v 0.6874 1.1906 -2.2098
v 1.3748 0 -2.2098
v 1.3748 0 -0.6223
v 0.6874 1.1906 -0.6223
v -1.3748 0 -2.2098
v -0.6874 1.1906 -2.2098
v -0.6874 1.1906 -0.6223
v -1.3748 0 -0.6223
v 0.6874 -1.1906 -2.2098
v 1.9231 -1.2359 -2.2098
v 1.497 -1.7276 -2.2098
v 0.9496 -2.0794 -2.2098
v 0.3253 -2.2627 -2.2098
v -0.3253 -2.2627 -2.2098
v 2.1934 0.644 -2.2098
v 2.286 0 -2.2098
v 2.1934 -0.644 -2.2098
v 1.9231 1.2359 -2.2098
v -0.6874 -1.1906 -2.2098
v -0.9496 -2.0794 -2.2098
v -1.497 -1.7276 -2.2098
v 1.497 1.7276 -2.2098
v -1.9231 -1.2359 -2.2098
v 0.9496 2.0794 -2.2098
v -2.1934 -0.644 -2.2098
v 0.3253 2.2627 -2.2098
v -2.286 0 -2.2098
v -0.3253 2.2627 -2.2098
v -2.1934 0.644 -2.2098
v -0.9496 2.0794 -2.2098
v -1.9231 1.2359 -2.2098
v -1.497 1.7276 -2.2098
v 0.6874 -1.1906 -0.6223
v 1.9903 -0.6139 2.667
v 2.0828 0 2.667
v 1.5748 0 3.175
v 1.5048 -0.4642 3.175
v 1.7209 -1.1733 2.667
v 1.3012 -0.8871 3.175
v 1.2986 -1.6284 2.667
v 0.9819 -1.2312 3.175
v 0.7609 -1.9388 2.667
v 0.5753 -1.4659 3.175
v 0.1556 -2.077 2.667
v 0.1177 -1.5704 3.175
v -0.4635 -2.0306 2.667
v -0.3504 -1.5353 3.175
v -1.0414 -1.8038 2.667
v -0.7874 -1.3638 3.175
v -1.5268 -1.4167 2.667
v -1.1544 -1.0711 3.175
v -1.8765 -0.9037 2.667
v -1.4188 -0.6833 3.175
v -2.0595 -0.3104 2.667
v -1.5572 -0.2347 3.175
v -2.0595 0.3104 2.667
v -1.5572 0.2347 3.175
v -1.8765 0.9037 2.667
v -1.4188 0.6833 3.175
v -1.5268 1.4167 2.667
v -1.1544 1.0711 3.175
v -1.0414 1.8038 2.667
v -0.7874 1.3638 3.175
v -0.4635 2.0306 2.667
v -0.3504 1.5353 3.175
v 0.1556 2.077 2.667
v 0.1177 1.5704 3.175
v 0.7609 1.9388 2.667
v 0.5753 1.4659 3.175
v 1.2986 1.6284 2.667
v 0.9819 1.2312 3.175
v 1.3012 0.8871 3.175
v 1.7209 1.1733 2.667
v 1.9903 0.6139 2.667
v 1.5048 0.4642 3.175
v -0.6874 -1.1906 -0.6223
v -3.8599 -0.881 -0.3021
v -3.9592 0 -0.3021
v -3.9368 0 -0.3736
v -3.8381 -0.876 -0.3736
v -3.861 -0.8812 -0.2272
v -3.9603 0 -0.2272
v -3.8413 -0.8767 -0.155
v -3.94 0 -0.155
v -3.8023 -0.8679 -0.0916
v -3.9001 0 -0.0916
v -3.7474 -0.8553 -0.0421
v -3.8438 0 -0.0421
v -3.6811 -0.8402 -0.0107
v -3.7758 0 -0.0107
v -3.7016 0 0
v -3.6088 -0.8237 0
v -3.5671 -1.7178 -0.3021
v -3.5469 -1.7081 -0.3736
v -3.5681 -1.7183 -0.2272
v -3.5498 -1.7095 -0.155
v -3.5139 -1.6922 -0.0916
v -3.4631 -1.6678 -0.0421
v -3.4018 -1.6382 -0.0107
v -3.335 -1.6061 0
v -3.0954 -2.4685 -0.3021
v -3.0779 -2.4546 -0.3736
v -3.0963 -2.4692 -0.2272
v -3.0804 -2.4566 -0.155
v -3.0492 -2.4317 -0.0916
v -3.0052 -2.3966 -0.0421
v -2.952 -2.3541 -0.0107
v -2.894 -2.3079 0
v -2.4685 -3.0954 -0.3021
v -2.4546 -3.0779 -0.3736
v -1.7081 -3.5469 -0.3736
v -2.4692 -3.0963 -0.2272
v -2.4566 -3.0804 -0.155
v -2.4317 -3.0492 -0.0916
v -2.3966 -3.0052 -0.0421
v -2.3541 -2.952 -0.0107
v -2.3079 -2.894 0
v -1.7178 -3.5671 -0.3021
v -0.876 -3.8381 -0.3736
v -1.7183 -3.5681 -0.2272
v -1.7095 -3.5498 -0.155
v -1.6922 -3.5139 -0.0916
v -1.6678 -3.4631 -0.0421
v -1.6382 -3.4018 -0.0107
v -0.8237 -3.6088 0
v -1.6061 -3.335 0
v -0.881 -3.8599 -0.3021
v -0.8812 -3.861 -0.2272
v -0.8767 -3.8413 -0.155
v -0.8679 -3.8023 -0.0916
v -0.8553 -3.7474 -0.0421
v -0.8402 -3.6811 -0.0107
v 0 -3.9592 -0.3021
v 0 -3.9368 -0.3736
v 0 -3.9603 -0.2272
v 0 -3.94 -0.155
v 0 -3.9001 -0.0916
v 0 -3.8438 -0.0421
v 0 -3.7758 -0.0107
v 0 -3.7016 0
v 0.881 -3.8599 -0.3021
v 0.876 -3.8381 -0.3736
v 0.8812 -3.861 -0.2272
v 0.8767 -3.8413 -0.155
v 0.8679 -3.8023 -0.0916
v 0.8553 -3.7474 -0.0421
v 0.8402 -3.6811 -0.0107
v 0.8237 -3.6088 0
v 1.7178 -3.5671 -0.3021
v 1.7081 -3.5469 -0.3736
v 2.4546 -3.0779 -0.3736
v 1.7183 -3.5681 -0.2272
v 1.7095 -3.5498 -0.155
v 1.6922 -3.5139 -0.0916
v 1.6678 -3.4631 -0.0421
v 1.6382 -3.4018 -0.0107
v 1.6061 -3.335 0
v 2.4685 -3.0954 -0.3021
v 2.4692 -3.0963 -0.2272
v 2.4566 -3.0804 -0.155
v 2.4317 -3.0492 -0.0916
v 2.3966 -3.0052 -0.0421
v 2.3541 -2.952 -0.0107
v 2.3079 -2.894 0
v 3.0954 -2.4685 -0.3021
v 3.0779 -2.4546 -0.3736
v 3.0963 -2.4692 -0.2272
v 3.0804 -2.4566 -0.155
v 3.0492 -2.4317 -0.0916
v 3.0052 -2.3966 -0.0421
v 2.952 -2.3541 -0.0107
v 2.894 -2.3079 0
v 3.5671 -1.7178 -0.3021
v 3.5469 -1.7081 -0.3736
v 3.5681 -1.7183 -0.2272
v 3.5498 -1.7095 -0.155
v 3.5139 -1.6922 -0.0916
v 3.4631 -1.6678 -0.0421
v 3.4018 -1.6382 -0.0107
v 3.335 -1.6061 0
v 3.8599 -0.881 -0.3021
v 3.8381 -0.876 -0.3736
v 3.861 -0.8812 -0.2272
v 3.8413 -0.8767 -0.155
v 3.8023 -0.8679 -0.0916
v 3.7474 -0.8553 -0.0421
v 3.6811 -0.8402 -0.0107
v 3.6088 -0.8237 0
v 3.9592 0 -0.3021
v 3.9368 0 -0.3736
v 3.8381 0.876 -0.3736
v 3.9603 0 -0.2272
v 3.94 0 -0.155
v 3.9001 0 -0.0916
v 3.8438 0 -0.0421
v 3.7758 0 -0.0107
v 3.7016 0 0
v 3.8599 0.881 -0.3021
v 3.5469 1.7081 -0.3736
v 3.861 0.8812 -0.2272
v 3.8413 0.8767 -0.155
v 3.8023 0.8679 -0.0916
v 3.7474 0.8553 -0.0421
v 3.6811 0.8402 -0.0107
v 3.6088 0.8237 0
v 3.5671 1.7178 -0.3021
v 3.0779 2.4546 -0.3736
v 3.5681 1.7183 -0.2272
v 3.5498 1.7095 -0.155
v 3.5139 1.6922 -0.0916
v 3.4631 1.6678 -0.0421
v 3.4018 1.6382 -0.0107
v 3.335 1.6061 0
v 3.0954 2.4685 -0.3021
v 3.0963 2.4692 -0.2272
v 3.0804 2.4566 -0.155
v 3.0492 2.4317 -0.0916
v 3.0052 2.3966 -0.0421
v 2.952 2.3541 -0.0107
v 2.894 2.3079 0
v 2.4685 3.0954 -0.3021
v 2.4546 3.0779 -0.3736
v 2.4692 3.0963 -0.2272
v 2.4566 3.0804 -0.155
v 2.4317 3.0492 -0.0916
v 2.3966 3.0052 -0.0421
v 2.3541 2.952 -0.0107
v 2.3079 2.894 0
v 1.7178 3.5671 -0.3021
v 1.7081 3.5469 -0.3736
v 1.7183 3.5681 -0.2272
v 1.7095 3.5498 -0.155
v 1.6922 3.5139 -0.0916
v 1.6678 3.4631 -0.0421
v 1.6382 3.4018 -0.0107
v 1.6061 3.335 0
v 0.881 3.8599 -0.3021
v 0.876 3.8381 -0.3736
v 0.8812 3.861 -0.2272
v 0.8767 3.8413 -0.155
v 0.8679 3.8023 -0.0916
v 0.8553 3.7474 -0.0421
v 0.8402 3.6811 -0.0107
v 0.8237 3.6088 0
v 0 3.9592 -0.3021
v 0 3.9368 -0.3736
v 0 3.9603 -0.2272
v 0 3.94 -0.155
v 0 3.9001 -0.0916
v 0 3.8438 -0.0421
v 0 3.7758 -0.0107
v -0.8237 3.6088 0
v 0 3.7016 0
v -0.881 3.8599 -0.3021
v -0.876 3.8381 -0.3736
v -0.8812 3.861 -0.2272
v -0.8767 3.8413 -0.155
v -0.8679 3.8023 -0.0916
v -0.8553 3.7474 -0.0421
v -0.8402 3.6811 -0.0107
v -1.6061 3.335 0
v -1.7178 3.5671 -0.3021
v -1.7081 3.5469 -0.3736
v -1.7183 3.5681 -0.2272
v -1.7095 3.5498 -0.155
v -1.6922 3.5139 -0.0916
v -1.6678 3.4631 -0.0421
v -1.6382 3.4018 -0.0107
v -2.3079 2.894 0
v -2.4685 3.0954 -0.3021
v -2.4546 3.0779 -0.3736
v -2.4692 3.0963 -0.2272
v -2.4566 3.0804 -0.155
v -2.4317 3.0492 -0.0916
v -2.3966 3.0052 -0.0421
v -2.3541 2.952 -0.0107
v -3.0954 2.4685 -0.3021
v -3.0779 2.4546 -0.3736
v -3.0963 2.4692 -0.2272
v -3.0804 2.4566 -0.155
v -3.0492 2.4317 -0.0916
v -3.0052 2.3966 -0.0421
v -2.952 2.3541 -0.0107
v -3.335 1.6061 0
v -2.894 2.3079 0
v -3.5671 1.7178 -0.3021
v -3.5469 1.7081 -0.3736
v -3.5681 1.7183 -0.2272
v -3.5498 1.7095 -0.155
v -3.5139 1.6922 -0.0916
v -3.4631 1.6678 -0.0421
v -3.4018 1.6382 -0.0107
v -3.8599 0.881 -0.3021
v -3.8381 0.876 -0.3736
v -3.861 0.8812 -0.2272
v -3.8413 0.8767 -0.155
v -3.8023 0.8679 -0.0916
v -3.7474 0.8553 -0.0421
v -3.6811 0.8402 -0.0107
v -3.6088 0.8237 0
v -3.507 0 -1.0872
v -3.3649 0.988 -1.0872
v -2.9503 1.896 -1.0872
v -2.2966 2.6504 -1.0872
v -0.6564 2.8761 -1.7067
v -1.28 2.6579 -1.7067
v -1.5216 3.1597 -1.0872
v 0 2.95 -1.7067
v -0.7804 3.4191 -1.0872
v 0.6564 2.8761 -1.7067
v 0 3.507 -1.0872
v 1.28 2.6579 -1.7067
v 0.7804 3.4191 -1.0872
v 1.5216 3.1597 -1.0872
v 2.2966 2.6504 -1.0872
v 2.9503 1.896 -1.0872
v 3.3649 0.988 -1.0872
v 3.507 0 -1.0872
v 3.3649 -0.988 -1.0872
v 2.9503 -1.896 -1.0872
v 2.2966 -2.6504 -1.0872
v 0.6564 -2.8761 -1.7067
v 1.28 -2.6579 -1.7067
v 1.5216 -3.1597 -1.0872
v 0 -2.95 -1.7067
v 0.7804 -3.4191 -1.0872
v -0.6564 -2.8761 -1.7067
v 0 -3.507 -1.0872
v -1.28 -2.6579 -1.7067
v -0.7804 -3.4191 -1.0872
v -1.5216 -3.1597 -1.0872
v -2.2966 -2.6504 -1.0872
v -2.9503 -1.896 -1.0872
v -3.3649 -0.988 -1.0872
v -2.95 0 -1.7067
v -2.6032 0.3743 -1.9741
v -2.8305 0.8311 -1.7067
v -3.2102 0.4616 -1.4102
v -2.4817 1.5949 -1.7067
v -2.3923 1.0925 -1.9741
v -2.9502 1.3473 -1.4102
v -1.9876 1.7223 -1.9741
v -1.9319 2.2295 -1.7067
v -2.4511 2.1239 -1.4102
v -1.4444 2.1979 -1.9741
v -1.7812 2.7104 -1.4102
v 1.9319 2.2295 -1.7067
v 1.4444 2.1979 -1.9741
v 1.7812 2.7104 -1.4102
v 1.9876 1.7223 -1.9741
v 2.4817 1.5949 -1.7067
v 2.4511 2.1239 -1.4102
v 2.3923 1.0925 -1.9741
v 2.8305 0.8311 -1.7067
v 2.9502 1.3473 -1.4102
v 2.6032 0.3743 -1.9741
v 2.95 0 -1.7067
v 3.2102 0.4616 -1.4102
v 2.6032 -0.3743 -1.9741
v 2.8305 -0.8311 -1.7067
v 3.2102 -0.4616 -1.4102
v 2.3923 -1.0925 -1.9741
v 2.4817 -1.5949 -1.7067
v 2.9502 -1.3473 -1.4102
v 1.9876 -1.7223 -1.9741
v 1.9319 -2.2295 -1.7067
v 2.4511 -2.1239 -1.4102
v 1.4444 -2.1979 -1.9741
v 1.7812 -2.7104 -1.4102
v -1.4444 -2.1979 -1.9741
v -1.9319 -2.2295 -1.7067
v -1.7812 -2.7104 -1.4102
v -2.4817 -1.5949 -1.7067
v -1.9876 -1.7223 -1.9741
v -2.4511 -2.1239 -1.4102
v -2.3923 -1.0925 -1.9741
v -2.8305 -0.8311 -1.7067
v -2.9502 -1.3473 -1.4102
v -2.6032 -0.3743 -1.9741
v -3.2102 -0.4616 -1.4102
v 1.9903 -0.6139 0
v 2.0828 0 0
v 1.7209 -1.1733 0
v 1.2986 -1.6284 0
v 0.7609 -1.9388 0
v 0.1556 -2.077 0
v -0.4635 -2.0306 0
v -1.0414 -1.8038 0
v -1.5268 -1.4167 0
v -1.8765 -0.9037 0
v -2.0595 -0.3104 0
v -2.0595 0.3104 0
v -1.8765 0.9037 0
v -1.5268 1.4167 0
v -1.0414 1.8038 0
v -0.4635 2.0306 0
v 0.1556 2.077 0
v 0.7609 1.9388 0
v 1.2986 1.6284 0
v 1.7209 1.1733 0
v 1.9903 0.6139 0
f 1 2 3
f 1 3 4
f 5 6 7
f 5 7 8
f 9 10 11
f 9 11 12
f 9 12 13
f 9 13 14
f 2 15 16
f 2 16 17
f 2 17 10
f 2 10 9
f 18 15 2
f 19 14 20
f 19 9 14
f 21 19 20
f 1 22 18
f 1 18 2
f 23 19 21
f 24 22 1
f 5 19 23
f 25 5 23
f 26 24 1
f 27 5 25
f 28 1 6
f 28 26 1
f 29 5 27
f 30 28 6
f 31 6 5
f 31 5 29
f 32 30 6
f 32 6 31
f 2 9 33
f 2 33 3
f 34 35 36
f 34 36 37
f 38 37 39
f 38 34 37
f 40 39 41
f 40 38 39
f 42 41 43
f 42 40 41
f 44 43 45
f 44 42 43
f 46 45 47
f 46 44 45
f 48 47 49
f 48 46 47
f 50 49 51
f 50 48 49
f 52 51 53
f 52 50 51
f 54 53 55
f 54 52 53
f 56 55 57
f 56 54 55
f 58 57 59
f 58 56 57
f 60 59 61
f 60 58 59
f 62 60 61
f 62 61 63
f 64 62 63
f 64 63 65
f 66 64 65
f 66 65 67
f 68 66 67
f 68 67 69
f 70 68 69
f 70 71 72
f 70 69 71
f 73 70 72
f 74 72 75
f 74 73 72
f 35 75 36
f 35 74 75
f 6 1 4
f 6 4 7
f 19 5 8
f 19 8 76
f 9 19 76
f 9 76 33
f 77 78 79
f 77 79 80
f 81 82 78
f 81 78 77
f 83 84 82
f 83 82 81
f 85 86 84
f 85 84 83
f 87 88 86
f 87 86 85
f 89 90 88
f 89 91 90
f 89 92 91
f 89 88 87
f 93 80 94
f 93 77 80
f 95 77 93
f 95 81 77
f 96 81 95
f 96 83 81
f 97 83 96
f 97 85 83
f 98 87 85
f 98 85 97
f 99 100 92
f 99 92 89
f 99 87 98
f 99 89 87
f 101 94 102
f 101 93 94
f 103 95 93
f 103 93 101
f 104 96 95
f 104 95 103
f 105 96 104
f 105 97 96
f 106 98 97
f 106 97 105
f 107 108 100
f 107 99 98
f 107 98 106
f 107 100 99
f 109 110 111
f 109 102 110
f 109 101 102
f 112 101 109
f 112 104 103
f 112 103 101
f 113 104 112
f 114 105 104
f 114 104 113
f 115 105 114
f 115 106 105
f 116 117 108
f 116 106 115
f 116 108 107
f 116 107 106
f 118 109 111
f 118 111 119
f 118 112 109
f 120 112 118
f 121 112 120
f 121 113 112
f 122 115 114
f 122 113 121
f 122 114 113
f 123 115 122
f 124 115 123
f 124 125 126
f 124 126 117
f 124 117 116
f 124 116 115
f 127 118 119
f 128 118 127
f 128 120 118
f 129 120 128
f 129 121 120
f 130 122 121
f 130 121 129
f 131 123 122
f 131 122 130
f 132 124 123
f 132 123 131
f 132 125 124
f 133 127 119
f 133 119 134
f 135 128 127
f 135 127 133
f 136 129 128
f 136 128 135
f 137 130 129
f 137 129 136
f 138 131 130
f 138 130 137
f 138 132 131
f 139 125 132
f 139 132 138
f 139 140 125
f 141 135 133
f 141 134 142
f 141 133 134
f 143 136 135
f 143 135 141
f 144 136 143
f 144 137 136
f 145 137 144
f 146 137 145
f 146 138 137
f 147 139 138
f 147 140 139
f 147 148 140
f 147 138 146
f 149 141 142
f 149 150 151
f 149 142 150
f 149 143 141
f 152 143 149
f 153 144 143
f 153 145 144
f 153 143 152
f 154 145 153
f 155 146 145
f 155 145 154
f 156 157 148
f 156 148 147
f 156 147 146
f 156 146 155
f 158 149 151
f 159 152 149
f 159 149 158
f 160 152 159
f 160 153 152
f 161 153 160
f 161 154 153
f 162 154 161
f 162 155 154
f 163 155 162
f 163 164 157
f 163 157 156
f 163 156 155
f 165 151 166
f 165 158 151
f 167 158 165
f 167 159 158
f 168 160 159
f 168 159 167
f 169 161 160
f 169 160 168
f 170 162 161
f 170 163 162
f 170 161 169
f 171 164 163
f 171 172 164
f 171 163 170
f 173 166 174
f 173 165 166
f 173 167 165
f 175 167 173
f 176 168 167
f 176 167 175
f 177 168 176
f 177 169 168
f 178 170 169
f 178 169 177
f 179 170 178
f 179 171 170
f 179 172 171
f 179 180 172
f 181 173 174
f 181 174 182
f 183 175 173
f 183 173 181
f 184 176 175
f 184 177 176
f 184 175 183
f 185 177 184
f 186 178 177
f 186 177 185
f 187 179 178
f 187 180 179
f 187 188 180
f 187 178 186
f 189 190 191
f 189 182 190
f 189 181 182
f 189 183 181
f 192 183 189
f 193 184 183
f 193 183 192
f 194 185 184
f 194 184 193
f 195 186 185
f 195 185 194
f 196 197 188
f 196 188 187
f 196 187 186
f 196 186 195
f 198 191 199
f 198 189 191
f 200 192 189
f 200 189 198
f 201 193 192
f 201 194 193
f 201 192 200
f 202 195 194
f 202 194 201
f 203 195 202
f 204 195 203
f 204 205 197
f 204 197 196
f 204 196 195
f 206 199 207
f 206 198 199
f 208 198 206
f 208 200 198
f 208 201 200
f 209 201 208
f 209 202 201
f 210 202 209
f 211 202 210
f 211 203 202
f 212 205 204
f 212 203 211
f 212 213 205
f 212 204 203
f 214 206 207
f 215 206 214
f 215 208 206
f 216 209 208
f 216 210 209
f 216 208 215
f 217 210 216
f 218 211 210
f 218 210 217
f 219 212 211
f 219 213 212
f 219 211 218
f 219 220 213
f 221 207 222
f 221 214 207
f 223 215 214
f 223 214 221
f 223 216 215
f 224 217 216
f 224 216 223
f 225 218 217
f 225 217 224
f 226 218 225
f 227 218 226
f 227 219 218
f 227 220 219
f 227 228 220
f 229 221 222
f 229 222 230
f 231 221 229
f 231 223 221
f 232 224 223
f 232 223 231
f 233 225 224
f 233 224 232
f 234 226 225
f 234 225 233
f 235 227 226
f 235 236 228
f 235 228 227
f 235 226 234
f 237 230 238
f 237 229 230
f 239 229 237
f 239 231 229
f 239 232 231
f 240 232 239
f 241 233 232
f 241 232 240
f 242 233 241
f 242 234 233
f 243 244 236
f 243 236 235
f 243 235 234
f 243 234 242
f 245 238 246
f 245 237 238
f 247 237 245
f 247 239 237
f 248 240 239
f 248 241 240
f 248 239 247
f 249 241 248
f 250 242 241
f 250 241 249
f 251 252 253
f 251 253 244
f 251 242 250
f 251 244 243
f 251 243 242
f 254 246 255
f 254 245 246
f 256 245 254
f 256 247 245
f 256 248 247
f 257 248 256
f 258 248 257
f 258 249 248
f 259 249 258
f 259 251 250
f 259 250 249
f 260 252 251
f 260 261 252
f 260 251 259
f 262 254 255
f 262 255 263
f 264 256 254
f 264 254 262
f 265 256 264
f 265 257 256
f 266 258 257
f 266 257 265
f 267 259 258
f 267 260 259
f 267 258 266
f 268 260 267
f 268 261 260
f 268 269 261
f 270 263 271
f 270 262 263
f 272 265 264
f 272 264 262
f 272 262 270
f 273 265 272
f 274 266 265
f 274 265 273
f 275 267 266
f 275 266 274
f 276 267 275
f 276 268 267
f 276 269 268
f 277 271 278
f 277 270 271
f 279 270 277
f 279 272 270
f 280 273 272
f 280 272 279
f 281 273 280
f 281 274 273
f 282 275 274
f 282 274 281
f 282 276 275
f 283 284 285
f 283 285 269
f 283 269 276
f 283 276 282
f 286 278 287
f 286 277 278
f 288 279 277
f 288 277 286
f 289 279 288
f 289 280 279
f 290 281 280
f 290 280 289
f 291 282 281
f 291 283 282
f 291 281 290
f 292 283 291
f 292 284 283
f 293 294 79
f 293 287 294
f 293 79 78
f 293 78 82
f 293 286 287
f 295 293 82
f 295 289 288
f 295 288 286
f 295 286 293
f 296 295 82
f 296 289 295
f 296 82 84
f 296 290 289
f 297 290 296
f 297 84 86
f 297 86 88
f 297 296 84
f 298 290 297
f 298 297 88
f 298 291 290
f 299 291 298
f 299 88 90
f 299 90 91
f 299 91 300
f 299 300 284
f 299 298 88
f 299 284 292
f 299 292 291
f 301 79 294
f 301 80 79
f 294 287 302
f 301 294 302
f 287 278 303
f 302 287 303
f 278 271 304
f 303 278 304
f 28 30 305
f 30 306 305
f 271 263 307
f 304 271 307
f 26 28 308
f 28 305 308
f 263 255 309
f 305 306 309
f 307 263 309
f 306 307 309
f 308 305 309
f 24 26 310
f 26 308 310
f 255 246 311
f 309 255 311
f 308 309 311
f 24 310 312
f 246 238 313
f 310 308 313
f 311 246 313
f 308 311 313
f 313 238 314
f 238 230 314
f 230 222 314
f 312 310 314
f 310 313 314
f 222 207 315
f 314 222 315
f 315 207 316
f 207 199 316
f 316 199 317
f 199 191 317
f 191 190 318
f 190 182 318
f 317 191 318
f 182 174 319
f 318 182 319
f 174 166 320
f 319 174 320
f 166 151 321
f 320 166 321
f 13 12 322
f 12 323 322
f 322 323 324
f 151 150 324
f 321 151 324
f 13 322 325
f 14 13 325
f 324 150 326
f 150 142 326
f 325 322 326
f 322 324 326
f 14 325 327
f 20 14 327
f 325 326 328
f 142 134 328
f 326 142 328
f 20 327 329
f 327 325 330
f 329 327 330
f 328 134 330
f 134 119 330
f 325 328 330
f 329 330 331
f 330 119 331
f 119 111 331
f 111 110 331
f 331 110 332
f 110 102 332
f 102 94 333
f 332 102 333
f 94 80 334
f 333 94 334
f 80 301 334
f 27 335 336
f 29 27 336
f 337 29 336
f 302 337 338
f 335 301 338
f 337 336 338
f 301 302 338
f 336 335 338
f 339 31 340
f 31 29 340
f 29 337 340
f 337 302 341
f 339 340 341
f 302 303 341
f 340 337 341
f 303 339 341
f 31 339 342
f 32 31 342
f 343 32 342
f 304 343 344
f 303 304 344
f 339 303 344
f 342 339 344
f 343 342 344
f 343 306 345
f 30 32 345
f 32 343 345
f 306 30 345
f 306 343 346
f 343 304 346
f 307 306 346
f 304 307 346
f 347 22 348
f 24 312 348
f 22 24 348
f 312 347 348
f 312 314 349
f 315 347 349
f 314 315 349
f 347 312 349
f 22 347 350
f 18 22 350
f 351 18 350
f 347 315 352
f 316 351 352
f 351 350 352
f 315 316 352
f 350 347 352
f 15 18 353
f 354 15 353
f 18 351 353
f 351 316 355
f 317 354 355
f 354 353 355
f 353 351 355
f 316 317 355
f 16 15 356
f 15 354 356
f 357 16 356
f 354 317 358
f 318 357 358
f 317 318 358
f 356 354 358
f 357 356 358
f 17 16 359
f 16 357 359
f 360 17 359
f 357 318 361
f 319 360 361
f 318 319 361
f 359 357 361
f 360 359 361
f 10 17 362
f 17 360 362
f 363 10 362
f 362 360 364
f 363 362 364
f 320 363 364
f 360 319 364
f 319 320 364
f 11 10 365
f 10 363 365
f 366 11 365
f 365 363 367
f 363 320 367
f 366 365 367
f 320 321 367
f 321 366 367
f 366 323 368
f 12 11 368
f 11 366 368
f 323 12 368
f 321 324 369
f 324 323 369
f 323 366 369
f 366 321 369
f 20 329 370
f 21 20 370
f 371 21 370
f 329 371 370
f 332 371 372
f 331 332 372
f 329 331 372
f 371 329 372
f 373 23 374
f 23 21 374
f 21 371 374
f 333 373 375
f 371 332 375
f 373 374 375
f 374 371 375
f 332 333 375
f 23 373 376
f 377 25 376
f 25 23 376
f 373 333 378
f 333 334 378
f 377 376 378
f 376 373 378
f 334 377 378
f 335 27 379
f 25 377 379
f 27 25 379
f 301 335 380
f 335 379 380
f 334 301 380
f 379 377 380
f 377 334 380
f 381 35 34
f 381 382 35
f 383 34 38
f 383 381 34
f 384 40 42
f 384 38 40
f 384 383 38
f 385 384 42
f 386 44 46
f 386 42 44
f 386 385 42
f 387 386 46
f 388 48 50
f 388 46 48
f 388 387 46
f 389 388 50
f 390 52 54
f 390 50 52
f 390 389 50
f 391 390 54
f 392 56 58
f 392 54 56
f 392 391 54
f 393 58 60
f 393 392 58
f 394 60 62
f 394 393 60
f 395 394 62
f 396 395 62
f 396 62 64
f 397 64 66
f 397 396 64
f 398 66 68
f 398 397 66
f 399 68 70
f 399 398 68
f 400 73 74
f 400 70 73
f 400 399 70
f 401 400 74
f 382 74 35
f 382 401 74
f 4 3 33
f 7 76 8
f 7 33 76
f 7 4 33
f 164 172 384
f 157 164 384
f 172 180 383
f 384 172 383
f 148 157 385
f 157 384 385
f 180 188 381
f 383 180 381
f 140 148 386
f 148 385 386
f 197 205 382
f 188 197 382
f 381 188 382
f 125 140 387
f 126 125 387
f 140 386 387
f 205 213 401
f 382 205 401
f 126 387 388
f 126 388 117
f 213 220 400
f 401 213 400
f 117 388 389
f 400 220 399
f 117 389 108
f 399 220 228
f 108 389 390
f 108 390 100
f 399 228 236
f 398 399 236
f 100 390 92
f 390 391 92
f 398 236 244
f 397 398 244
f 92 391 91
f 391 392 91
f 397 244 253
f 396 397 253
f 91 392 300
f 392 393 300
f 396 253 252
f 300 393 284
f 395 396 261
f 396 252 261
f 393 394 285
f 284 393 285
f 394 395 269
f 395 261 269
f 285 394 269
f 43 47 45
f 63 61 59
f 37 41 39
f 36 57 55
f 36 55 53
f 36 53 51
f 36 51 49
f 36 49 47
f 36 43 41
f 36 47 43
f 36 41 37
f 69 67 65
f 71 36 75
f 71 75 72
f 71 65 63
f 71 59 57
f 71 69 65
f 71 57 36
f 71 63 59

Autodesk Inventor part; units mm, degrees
ref_plane "YZ Plane" through (0, 0, 0) normal (1, 0, 0) x (0, 1, 0)
ref_plane "XZ Plane" through (0, 0, 0) normal (0, 1, 0) x (-1, 0, 0)
ref_plane "XY Plane" through (0, 0, 0) normal (0, 0, 1) x (1, 0, 0)
sketch "Sketch1" plane through (0, 0, 0) normal (0, 0, 1) x (1, 0, 0)
  circle A0 centre (0, 0) radius 2.0828
  dimension "d0" = 4.1656
extrude "Extrusion1" add sketch "Sketch1" along normal blind 3.175
sketch "Sketch2" plane through (0, 0, 0) normal (0, 1, 0) x (-1, 0, 0)
  line L0 (0, 0) -> (0, -2.2098)
  line L1 (0, 0) -> (3.7016, 0)
  line L2 (0, -2.2098) -> (2.286, -2.2098)
  line L3 (3.7016, 0) -> (3.7016, 3.8864) construction
  arc A0 (3.9368, -0.3736) -> (3.7016, 0) centre (3.7016, -0.2608) ccw
  arc A1 (2.286, -2.2098) -> (3.9368, -0.3736) centre (-0.0192, 1.5228) ccw
  line L4 (3.9624, 0.6553) -> (3.9624, -0.2608) construction
  dimension "d3" = 2.2098
  dimension "d6" = 2.286
  dimension "d12" = 3.9624
revolve "Revolution1" add sketch "Sketch2" angle 360 about axis through (0, 0, 0) along (0, 0, -1)
sketch "Sketch3" plane through (0, 0, -2.2098) normal (0, 0, -1) x (-1, 0, 0)
  circle A0 centre (0, 0) radius 2.286 projected
  line L0 (-0.6874, 1.1906) -> (0.6874, 1.1906)
  line L1 (0.6874, 1.1906) -> (1.3748, 0)
  line L2 (1.3748, 0) -> (0.6874, -1.1906)
  line L3 (0.6874, -1.1906) -> (-0.6874, -1.1906)
  line L4 (-0.6874, -1.1906) -> (-1.3748, 0)
  line L5 (-1.3748, 0) -> (-0.6874, 1.1906)
  dimension "d8" = 2.3813
extrude "Extrusion2" cut sketch "Sketch3" against normal blind 1.5875 contours L0 L1 L2 L3 L4 L5
chamfer "Chamfer1" distance 0.508 angle 45 1 edges at (-2.0828, 0, 3.175)
thread "Thread1" size "8-32 UNC" class "2A" standard "ANSI Unified Screw Threads" full length
properties part number "10-32 x438 button head" material "Steel"
